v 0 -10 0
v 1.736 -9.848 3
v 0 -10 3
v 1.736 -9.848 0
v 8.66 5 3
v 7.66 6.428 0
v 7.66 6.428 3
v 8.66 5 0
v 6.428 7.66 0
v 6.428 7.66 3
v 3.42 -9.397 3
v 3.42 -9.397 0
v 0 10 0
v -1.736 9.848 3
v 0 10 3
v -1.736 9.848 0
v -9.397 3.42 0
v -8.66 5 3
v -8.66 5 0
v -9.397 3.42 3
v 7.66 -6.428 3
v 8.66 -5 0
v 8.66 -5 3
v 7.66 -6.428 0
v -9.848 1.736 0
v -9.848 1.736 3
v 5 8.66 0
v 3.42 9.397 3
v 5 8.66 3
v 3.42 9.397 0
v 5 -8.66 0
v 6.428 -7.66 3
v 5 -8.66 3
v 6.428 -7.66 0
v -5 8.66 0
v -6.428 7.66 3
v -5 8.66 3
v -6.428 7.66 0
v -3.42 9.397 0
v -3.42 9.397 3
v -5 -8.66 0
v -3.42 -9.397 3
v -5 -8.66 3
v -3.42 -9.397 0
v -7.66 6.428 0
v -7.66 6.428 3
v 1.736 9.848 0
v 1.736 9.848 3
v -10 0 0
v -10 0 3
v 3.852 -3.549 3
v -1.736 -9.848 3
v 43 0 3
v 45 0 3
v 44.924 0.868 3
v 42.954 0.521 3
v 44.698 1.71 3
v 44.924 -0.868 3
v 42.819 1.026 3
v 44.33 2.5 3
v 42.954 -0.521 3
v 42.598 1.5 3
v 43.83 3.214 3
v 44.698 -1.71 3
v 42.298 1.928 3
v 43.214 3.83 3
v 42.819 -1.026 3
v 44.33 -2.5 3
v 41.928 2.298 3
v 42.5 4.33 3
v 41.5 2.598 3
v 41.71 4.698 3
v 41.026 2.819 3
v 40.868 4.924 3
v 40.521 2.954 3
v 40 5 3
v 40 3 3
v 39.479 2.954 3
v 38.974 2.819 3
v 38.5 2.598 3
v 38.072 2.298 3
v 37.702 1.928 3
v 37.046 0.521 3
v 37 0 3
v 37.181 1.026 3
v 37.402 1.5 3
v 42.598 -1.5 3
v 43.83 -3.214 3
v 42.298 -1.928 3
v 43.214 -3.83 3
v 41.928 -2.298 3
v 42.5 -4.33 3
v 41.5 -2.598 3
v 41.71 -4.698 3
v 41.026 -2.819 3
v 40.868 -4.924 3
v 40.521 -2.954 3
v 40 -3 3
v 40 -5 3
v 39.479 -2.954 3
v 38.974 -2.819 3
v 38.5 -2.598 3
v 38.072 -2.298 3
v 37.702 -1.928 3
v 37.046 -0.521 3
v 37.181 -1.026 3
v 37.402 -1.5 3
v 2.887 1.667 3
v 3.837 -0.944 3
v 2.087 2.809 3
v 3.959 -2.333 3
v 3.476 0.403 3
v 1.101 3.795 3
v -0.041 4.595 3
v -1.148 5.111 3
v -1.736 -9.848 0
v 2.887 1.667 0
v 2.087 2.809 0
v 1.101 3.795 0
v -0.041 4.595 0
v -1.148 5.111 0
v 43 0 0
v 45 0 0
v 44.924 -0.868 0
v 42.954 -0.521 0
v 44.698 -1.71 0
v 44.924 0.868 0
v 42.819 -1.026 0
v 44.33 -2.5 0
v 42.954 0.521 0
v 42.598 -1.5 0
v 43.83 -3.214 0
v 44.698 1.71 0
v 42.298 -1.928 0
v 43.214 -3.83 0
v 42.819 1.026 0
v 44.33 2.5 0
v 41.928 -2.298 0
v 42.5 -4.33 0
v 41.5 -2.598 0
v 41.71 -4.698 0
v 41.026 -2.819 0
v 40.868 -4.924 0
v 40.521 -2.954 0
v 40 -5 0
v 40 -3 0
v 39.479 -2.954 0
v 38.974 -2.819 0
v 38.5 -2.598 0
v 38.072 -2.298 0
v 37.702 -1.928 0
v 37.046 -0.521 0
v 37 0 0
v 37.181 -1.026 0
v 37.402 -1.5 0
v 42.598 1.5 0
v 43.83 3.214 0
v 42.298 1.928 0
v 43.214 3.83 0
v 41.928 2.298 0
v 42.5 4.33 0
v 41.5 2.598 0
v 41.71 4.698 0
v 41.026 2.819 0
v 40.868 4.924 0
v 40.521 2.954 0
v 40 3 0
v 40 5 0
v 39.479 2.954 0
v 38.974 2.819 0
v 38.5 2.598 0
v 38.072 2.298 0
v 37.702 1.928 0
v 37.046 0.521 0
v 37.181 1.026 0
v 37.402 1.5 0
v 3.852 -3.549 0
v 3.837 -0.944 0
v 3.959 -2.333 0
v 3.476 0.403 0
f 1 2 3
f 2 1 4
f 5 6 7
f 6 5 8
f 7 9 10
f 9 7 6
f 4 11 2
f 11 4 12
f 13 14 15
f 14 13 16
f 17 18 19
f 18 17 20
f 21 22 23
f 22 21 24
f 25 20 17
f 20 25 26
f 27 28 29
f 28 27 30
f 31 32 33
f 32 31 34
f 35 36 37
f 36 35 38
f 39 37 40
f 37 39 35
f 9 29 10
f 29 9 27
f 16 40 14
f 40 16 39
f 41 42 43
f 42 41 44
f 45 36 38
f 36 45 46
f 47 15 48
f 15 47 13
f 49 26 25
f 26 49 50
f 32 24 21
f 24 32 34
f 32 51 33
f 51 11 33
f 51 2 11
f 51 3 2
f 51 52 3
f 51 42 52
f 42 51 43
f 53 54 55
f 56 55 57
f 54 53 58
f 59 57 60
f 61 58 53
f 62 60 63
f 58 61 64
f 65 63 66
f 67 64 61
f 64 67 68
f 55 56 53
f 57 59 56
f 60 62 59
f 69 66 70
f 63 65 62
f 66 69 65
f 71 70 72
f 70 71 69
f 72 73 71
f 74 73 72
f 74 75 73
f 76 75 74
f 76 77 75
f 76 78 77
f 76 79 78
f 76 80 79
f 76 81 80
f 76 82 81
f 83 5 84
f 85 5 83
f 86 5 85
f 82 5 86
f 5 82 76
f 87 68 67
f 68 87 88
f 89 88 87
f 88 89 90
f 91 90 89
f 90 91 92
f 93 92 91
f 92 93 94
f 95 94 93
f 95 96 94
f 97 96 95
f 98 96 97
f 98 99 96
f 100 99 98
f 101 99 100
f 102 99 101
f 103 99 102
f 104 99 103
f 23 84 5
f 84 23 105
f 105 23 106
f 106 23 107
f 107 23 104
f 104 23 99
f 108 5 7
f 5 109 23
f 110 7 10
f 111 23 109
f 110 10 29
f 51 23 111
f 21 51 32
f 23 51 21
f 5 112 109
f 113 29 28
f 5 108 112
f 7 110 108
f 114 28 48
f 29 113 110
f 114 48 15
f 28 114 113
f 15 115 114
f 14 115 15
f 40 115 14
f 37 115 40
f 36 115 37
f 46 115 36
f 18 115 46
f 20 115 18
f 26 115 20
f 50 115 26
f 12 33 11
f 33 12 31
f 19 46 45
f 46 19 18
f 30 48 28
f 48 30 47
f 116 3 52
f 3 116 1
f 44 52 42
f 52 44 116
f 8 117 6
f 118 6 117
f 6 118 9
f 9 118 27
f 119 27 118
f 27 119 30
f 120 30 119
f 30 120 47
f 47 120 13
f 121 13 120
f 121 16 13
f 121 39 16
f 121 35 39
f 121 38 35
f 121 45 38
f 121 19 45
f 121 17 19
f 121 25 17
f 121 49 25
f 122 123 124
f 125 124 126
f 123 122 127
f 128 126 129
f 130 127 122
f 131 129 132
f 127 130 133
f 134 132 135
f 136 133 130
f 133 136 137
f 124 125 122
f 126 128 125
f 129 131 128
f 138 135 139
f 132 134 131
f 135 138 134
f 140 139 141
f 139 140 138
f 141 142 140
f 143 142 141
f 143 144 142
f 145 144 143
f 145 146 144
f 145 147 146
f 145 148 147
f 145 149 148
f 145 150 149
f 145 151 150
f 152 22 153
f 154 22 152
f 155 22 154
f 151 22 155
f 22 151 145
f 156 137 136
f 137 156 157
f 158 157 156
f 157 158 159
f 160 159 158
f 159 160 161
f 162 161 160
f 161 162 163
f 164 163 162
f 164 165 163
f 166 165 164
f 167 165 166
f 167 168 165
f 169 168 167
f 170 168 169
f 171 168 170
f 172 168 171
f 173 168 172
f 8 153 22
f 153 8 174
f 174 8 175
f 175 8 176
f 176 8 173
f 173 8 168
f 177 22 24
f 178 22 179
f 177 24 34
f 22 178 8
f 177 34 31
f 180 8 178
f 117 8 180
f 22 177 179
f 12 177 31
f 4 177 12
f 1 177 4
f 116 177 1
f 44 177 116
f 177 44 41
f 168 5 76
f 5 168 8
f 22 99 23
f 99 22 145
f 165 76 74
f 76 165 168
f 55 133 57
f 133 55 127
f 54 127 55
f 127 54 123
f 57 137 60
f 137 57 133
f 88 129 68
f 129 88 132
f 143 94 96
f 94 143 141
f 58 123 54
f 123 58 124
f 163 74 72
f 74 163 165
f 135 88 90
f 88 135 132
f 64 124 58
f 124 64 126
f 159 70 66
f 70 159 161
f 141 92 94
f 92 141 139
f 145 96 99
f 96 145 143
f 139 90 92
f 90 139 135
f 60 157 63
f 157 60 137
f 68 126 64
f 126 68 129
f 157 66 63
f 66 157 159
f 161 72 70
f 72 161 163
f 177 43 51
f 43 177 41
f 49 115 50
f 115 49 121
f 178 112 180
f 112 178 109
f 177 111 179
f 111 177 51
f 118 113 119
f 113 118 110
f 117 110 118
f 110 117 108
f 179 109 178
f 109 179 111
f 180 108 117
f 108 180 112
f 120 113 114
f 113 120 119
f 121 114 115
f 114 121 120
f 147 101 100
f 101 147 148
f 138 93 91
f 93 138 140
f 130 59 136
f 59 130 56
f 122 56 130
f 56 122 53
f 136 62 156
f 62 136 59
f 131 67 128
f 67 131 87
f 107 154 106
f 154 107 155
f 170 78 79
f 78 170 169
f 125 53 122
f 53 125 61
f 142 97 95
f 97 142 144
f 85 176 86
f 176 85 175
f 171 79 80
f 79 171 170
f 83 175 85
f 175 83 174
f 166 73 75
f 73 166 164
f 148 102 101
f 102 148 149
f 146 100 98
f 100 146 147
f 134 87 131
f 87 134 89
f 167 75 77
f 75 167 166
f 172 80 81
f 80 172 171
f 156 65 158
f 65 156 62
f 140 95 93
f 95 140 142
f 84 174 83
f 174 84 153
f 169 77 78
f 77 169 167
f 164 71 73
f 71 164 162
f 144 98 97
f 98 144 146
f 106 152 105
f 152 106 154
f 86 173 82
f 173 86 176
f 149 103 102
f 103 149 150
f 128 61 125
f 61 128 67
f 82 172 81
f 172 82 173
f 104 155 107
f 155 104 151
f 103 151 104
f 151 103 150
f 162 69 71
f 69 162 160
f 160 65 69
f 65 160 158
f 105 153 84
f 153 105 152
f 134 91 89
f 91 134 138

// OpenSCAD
// A wrench model.

$fs = .5;
$fa = 10;

// A size used for making holes. Any part of the model that gets
// a hole should lie within the two planes z = +/- maxModelHeight.
maxModelHeight = 10;

// Dimensions of the wrench handle and hole at the end.
handleLength = 45;
handleWidth = 10;
handleHeight = 3;

handleHoleDiameter = handleWidth - 4;

// Dimensions of the head end and the slot.
headDiameter = 2*handleWidth;

slotWidth = 10;
slotLength = headDiameter * 3/4;
slotRoundingRadius = 8;
slotRotation = 30;

difference() {
  // The handle and head, minus the slot and hole.
  union() {
    cylinder(d=headDiameter, h=handleHeight);

    translate([0, -handleWidth/2, 0])
    cube(size=[handleLength - handleWidth/2, handleWidth, handleHeight]);

    translate([handleLength - handleWidth/2, 0, 0])
    cylinder(d=handleWidth, h=handleHeight);
  }

  // The hole at the end of the handle.
  translate([handleLength - handleHoleDiameter/2 - 2, 0, 0])
  cylinder(d=handleHoleDiameter, h=2*maxModelHeight, center=true);

  // The slot in the head.
  rotate(180 + slotRotation)
  translate([-headDiameter/6, -slotWidth/2, -maxModelHeight])
  intersection() {
    cube(size=[headDiameter, slotWidth, 2*maxModelHeight]);
    
    translate([slotRoundingRadius, slotWidth/2, 0])
    cylinder(r=slotRoundingRadius, h=2*maxModelHeight);
  }
}
